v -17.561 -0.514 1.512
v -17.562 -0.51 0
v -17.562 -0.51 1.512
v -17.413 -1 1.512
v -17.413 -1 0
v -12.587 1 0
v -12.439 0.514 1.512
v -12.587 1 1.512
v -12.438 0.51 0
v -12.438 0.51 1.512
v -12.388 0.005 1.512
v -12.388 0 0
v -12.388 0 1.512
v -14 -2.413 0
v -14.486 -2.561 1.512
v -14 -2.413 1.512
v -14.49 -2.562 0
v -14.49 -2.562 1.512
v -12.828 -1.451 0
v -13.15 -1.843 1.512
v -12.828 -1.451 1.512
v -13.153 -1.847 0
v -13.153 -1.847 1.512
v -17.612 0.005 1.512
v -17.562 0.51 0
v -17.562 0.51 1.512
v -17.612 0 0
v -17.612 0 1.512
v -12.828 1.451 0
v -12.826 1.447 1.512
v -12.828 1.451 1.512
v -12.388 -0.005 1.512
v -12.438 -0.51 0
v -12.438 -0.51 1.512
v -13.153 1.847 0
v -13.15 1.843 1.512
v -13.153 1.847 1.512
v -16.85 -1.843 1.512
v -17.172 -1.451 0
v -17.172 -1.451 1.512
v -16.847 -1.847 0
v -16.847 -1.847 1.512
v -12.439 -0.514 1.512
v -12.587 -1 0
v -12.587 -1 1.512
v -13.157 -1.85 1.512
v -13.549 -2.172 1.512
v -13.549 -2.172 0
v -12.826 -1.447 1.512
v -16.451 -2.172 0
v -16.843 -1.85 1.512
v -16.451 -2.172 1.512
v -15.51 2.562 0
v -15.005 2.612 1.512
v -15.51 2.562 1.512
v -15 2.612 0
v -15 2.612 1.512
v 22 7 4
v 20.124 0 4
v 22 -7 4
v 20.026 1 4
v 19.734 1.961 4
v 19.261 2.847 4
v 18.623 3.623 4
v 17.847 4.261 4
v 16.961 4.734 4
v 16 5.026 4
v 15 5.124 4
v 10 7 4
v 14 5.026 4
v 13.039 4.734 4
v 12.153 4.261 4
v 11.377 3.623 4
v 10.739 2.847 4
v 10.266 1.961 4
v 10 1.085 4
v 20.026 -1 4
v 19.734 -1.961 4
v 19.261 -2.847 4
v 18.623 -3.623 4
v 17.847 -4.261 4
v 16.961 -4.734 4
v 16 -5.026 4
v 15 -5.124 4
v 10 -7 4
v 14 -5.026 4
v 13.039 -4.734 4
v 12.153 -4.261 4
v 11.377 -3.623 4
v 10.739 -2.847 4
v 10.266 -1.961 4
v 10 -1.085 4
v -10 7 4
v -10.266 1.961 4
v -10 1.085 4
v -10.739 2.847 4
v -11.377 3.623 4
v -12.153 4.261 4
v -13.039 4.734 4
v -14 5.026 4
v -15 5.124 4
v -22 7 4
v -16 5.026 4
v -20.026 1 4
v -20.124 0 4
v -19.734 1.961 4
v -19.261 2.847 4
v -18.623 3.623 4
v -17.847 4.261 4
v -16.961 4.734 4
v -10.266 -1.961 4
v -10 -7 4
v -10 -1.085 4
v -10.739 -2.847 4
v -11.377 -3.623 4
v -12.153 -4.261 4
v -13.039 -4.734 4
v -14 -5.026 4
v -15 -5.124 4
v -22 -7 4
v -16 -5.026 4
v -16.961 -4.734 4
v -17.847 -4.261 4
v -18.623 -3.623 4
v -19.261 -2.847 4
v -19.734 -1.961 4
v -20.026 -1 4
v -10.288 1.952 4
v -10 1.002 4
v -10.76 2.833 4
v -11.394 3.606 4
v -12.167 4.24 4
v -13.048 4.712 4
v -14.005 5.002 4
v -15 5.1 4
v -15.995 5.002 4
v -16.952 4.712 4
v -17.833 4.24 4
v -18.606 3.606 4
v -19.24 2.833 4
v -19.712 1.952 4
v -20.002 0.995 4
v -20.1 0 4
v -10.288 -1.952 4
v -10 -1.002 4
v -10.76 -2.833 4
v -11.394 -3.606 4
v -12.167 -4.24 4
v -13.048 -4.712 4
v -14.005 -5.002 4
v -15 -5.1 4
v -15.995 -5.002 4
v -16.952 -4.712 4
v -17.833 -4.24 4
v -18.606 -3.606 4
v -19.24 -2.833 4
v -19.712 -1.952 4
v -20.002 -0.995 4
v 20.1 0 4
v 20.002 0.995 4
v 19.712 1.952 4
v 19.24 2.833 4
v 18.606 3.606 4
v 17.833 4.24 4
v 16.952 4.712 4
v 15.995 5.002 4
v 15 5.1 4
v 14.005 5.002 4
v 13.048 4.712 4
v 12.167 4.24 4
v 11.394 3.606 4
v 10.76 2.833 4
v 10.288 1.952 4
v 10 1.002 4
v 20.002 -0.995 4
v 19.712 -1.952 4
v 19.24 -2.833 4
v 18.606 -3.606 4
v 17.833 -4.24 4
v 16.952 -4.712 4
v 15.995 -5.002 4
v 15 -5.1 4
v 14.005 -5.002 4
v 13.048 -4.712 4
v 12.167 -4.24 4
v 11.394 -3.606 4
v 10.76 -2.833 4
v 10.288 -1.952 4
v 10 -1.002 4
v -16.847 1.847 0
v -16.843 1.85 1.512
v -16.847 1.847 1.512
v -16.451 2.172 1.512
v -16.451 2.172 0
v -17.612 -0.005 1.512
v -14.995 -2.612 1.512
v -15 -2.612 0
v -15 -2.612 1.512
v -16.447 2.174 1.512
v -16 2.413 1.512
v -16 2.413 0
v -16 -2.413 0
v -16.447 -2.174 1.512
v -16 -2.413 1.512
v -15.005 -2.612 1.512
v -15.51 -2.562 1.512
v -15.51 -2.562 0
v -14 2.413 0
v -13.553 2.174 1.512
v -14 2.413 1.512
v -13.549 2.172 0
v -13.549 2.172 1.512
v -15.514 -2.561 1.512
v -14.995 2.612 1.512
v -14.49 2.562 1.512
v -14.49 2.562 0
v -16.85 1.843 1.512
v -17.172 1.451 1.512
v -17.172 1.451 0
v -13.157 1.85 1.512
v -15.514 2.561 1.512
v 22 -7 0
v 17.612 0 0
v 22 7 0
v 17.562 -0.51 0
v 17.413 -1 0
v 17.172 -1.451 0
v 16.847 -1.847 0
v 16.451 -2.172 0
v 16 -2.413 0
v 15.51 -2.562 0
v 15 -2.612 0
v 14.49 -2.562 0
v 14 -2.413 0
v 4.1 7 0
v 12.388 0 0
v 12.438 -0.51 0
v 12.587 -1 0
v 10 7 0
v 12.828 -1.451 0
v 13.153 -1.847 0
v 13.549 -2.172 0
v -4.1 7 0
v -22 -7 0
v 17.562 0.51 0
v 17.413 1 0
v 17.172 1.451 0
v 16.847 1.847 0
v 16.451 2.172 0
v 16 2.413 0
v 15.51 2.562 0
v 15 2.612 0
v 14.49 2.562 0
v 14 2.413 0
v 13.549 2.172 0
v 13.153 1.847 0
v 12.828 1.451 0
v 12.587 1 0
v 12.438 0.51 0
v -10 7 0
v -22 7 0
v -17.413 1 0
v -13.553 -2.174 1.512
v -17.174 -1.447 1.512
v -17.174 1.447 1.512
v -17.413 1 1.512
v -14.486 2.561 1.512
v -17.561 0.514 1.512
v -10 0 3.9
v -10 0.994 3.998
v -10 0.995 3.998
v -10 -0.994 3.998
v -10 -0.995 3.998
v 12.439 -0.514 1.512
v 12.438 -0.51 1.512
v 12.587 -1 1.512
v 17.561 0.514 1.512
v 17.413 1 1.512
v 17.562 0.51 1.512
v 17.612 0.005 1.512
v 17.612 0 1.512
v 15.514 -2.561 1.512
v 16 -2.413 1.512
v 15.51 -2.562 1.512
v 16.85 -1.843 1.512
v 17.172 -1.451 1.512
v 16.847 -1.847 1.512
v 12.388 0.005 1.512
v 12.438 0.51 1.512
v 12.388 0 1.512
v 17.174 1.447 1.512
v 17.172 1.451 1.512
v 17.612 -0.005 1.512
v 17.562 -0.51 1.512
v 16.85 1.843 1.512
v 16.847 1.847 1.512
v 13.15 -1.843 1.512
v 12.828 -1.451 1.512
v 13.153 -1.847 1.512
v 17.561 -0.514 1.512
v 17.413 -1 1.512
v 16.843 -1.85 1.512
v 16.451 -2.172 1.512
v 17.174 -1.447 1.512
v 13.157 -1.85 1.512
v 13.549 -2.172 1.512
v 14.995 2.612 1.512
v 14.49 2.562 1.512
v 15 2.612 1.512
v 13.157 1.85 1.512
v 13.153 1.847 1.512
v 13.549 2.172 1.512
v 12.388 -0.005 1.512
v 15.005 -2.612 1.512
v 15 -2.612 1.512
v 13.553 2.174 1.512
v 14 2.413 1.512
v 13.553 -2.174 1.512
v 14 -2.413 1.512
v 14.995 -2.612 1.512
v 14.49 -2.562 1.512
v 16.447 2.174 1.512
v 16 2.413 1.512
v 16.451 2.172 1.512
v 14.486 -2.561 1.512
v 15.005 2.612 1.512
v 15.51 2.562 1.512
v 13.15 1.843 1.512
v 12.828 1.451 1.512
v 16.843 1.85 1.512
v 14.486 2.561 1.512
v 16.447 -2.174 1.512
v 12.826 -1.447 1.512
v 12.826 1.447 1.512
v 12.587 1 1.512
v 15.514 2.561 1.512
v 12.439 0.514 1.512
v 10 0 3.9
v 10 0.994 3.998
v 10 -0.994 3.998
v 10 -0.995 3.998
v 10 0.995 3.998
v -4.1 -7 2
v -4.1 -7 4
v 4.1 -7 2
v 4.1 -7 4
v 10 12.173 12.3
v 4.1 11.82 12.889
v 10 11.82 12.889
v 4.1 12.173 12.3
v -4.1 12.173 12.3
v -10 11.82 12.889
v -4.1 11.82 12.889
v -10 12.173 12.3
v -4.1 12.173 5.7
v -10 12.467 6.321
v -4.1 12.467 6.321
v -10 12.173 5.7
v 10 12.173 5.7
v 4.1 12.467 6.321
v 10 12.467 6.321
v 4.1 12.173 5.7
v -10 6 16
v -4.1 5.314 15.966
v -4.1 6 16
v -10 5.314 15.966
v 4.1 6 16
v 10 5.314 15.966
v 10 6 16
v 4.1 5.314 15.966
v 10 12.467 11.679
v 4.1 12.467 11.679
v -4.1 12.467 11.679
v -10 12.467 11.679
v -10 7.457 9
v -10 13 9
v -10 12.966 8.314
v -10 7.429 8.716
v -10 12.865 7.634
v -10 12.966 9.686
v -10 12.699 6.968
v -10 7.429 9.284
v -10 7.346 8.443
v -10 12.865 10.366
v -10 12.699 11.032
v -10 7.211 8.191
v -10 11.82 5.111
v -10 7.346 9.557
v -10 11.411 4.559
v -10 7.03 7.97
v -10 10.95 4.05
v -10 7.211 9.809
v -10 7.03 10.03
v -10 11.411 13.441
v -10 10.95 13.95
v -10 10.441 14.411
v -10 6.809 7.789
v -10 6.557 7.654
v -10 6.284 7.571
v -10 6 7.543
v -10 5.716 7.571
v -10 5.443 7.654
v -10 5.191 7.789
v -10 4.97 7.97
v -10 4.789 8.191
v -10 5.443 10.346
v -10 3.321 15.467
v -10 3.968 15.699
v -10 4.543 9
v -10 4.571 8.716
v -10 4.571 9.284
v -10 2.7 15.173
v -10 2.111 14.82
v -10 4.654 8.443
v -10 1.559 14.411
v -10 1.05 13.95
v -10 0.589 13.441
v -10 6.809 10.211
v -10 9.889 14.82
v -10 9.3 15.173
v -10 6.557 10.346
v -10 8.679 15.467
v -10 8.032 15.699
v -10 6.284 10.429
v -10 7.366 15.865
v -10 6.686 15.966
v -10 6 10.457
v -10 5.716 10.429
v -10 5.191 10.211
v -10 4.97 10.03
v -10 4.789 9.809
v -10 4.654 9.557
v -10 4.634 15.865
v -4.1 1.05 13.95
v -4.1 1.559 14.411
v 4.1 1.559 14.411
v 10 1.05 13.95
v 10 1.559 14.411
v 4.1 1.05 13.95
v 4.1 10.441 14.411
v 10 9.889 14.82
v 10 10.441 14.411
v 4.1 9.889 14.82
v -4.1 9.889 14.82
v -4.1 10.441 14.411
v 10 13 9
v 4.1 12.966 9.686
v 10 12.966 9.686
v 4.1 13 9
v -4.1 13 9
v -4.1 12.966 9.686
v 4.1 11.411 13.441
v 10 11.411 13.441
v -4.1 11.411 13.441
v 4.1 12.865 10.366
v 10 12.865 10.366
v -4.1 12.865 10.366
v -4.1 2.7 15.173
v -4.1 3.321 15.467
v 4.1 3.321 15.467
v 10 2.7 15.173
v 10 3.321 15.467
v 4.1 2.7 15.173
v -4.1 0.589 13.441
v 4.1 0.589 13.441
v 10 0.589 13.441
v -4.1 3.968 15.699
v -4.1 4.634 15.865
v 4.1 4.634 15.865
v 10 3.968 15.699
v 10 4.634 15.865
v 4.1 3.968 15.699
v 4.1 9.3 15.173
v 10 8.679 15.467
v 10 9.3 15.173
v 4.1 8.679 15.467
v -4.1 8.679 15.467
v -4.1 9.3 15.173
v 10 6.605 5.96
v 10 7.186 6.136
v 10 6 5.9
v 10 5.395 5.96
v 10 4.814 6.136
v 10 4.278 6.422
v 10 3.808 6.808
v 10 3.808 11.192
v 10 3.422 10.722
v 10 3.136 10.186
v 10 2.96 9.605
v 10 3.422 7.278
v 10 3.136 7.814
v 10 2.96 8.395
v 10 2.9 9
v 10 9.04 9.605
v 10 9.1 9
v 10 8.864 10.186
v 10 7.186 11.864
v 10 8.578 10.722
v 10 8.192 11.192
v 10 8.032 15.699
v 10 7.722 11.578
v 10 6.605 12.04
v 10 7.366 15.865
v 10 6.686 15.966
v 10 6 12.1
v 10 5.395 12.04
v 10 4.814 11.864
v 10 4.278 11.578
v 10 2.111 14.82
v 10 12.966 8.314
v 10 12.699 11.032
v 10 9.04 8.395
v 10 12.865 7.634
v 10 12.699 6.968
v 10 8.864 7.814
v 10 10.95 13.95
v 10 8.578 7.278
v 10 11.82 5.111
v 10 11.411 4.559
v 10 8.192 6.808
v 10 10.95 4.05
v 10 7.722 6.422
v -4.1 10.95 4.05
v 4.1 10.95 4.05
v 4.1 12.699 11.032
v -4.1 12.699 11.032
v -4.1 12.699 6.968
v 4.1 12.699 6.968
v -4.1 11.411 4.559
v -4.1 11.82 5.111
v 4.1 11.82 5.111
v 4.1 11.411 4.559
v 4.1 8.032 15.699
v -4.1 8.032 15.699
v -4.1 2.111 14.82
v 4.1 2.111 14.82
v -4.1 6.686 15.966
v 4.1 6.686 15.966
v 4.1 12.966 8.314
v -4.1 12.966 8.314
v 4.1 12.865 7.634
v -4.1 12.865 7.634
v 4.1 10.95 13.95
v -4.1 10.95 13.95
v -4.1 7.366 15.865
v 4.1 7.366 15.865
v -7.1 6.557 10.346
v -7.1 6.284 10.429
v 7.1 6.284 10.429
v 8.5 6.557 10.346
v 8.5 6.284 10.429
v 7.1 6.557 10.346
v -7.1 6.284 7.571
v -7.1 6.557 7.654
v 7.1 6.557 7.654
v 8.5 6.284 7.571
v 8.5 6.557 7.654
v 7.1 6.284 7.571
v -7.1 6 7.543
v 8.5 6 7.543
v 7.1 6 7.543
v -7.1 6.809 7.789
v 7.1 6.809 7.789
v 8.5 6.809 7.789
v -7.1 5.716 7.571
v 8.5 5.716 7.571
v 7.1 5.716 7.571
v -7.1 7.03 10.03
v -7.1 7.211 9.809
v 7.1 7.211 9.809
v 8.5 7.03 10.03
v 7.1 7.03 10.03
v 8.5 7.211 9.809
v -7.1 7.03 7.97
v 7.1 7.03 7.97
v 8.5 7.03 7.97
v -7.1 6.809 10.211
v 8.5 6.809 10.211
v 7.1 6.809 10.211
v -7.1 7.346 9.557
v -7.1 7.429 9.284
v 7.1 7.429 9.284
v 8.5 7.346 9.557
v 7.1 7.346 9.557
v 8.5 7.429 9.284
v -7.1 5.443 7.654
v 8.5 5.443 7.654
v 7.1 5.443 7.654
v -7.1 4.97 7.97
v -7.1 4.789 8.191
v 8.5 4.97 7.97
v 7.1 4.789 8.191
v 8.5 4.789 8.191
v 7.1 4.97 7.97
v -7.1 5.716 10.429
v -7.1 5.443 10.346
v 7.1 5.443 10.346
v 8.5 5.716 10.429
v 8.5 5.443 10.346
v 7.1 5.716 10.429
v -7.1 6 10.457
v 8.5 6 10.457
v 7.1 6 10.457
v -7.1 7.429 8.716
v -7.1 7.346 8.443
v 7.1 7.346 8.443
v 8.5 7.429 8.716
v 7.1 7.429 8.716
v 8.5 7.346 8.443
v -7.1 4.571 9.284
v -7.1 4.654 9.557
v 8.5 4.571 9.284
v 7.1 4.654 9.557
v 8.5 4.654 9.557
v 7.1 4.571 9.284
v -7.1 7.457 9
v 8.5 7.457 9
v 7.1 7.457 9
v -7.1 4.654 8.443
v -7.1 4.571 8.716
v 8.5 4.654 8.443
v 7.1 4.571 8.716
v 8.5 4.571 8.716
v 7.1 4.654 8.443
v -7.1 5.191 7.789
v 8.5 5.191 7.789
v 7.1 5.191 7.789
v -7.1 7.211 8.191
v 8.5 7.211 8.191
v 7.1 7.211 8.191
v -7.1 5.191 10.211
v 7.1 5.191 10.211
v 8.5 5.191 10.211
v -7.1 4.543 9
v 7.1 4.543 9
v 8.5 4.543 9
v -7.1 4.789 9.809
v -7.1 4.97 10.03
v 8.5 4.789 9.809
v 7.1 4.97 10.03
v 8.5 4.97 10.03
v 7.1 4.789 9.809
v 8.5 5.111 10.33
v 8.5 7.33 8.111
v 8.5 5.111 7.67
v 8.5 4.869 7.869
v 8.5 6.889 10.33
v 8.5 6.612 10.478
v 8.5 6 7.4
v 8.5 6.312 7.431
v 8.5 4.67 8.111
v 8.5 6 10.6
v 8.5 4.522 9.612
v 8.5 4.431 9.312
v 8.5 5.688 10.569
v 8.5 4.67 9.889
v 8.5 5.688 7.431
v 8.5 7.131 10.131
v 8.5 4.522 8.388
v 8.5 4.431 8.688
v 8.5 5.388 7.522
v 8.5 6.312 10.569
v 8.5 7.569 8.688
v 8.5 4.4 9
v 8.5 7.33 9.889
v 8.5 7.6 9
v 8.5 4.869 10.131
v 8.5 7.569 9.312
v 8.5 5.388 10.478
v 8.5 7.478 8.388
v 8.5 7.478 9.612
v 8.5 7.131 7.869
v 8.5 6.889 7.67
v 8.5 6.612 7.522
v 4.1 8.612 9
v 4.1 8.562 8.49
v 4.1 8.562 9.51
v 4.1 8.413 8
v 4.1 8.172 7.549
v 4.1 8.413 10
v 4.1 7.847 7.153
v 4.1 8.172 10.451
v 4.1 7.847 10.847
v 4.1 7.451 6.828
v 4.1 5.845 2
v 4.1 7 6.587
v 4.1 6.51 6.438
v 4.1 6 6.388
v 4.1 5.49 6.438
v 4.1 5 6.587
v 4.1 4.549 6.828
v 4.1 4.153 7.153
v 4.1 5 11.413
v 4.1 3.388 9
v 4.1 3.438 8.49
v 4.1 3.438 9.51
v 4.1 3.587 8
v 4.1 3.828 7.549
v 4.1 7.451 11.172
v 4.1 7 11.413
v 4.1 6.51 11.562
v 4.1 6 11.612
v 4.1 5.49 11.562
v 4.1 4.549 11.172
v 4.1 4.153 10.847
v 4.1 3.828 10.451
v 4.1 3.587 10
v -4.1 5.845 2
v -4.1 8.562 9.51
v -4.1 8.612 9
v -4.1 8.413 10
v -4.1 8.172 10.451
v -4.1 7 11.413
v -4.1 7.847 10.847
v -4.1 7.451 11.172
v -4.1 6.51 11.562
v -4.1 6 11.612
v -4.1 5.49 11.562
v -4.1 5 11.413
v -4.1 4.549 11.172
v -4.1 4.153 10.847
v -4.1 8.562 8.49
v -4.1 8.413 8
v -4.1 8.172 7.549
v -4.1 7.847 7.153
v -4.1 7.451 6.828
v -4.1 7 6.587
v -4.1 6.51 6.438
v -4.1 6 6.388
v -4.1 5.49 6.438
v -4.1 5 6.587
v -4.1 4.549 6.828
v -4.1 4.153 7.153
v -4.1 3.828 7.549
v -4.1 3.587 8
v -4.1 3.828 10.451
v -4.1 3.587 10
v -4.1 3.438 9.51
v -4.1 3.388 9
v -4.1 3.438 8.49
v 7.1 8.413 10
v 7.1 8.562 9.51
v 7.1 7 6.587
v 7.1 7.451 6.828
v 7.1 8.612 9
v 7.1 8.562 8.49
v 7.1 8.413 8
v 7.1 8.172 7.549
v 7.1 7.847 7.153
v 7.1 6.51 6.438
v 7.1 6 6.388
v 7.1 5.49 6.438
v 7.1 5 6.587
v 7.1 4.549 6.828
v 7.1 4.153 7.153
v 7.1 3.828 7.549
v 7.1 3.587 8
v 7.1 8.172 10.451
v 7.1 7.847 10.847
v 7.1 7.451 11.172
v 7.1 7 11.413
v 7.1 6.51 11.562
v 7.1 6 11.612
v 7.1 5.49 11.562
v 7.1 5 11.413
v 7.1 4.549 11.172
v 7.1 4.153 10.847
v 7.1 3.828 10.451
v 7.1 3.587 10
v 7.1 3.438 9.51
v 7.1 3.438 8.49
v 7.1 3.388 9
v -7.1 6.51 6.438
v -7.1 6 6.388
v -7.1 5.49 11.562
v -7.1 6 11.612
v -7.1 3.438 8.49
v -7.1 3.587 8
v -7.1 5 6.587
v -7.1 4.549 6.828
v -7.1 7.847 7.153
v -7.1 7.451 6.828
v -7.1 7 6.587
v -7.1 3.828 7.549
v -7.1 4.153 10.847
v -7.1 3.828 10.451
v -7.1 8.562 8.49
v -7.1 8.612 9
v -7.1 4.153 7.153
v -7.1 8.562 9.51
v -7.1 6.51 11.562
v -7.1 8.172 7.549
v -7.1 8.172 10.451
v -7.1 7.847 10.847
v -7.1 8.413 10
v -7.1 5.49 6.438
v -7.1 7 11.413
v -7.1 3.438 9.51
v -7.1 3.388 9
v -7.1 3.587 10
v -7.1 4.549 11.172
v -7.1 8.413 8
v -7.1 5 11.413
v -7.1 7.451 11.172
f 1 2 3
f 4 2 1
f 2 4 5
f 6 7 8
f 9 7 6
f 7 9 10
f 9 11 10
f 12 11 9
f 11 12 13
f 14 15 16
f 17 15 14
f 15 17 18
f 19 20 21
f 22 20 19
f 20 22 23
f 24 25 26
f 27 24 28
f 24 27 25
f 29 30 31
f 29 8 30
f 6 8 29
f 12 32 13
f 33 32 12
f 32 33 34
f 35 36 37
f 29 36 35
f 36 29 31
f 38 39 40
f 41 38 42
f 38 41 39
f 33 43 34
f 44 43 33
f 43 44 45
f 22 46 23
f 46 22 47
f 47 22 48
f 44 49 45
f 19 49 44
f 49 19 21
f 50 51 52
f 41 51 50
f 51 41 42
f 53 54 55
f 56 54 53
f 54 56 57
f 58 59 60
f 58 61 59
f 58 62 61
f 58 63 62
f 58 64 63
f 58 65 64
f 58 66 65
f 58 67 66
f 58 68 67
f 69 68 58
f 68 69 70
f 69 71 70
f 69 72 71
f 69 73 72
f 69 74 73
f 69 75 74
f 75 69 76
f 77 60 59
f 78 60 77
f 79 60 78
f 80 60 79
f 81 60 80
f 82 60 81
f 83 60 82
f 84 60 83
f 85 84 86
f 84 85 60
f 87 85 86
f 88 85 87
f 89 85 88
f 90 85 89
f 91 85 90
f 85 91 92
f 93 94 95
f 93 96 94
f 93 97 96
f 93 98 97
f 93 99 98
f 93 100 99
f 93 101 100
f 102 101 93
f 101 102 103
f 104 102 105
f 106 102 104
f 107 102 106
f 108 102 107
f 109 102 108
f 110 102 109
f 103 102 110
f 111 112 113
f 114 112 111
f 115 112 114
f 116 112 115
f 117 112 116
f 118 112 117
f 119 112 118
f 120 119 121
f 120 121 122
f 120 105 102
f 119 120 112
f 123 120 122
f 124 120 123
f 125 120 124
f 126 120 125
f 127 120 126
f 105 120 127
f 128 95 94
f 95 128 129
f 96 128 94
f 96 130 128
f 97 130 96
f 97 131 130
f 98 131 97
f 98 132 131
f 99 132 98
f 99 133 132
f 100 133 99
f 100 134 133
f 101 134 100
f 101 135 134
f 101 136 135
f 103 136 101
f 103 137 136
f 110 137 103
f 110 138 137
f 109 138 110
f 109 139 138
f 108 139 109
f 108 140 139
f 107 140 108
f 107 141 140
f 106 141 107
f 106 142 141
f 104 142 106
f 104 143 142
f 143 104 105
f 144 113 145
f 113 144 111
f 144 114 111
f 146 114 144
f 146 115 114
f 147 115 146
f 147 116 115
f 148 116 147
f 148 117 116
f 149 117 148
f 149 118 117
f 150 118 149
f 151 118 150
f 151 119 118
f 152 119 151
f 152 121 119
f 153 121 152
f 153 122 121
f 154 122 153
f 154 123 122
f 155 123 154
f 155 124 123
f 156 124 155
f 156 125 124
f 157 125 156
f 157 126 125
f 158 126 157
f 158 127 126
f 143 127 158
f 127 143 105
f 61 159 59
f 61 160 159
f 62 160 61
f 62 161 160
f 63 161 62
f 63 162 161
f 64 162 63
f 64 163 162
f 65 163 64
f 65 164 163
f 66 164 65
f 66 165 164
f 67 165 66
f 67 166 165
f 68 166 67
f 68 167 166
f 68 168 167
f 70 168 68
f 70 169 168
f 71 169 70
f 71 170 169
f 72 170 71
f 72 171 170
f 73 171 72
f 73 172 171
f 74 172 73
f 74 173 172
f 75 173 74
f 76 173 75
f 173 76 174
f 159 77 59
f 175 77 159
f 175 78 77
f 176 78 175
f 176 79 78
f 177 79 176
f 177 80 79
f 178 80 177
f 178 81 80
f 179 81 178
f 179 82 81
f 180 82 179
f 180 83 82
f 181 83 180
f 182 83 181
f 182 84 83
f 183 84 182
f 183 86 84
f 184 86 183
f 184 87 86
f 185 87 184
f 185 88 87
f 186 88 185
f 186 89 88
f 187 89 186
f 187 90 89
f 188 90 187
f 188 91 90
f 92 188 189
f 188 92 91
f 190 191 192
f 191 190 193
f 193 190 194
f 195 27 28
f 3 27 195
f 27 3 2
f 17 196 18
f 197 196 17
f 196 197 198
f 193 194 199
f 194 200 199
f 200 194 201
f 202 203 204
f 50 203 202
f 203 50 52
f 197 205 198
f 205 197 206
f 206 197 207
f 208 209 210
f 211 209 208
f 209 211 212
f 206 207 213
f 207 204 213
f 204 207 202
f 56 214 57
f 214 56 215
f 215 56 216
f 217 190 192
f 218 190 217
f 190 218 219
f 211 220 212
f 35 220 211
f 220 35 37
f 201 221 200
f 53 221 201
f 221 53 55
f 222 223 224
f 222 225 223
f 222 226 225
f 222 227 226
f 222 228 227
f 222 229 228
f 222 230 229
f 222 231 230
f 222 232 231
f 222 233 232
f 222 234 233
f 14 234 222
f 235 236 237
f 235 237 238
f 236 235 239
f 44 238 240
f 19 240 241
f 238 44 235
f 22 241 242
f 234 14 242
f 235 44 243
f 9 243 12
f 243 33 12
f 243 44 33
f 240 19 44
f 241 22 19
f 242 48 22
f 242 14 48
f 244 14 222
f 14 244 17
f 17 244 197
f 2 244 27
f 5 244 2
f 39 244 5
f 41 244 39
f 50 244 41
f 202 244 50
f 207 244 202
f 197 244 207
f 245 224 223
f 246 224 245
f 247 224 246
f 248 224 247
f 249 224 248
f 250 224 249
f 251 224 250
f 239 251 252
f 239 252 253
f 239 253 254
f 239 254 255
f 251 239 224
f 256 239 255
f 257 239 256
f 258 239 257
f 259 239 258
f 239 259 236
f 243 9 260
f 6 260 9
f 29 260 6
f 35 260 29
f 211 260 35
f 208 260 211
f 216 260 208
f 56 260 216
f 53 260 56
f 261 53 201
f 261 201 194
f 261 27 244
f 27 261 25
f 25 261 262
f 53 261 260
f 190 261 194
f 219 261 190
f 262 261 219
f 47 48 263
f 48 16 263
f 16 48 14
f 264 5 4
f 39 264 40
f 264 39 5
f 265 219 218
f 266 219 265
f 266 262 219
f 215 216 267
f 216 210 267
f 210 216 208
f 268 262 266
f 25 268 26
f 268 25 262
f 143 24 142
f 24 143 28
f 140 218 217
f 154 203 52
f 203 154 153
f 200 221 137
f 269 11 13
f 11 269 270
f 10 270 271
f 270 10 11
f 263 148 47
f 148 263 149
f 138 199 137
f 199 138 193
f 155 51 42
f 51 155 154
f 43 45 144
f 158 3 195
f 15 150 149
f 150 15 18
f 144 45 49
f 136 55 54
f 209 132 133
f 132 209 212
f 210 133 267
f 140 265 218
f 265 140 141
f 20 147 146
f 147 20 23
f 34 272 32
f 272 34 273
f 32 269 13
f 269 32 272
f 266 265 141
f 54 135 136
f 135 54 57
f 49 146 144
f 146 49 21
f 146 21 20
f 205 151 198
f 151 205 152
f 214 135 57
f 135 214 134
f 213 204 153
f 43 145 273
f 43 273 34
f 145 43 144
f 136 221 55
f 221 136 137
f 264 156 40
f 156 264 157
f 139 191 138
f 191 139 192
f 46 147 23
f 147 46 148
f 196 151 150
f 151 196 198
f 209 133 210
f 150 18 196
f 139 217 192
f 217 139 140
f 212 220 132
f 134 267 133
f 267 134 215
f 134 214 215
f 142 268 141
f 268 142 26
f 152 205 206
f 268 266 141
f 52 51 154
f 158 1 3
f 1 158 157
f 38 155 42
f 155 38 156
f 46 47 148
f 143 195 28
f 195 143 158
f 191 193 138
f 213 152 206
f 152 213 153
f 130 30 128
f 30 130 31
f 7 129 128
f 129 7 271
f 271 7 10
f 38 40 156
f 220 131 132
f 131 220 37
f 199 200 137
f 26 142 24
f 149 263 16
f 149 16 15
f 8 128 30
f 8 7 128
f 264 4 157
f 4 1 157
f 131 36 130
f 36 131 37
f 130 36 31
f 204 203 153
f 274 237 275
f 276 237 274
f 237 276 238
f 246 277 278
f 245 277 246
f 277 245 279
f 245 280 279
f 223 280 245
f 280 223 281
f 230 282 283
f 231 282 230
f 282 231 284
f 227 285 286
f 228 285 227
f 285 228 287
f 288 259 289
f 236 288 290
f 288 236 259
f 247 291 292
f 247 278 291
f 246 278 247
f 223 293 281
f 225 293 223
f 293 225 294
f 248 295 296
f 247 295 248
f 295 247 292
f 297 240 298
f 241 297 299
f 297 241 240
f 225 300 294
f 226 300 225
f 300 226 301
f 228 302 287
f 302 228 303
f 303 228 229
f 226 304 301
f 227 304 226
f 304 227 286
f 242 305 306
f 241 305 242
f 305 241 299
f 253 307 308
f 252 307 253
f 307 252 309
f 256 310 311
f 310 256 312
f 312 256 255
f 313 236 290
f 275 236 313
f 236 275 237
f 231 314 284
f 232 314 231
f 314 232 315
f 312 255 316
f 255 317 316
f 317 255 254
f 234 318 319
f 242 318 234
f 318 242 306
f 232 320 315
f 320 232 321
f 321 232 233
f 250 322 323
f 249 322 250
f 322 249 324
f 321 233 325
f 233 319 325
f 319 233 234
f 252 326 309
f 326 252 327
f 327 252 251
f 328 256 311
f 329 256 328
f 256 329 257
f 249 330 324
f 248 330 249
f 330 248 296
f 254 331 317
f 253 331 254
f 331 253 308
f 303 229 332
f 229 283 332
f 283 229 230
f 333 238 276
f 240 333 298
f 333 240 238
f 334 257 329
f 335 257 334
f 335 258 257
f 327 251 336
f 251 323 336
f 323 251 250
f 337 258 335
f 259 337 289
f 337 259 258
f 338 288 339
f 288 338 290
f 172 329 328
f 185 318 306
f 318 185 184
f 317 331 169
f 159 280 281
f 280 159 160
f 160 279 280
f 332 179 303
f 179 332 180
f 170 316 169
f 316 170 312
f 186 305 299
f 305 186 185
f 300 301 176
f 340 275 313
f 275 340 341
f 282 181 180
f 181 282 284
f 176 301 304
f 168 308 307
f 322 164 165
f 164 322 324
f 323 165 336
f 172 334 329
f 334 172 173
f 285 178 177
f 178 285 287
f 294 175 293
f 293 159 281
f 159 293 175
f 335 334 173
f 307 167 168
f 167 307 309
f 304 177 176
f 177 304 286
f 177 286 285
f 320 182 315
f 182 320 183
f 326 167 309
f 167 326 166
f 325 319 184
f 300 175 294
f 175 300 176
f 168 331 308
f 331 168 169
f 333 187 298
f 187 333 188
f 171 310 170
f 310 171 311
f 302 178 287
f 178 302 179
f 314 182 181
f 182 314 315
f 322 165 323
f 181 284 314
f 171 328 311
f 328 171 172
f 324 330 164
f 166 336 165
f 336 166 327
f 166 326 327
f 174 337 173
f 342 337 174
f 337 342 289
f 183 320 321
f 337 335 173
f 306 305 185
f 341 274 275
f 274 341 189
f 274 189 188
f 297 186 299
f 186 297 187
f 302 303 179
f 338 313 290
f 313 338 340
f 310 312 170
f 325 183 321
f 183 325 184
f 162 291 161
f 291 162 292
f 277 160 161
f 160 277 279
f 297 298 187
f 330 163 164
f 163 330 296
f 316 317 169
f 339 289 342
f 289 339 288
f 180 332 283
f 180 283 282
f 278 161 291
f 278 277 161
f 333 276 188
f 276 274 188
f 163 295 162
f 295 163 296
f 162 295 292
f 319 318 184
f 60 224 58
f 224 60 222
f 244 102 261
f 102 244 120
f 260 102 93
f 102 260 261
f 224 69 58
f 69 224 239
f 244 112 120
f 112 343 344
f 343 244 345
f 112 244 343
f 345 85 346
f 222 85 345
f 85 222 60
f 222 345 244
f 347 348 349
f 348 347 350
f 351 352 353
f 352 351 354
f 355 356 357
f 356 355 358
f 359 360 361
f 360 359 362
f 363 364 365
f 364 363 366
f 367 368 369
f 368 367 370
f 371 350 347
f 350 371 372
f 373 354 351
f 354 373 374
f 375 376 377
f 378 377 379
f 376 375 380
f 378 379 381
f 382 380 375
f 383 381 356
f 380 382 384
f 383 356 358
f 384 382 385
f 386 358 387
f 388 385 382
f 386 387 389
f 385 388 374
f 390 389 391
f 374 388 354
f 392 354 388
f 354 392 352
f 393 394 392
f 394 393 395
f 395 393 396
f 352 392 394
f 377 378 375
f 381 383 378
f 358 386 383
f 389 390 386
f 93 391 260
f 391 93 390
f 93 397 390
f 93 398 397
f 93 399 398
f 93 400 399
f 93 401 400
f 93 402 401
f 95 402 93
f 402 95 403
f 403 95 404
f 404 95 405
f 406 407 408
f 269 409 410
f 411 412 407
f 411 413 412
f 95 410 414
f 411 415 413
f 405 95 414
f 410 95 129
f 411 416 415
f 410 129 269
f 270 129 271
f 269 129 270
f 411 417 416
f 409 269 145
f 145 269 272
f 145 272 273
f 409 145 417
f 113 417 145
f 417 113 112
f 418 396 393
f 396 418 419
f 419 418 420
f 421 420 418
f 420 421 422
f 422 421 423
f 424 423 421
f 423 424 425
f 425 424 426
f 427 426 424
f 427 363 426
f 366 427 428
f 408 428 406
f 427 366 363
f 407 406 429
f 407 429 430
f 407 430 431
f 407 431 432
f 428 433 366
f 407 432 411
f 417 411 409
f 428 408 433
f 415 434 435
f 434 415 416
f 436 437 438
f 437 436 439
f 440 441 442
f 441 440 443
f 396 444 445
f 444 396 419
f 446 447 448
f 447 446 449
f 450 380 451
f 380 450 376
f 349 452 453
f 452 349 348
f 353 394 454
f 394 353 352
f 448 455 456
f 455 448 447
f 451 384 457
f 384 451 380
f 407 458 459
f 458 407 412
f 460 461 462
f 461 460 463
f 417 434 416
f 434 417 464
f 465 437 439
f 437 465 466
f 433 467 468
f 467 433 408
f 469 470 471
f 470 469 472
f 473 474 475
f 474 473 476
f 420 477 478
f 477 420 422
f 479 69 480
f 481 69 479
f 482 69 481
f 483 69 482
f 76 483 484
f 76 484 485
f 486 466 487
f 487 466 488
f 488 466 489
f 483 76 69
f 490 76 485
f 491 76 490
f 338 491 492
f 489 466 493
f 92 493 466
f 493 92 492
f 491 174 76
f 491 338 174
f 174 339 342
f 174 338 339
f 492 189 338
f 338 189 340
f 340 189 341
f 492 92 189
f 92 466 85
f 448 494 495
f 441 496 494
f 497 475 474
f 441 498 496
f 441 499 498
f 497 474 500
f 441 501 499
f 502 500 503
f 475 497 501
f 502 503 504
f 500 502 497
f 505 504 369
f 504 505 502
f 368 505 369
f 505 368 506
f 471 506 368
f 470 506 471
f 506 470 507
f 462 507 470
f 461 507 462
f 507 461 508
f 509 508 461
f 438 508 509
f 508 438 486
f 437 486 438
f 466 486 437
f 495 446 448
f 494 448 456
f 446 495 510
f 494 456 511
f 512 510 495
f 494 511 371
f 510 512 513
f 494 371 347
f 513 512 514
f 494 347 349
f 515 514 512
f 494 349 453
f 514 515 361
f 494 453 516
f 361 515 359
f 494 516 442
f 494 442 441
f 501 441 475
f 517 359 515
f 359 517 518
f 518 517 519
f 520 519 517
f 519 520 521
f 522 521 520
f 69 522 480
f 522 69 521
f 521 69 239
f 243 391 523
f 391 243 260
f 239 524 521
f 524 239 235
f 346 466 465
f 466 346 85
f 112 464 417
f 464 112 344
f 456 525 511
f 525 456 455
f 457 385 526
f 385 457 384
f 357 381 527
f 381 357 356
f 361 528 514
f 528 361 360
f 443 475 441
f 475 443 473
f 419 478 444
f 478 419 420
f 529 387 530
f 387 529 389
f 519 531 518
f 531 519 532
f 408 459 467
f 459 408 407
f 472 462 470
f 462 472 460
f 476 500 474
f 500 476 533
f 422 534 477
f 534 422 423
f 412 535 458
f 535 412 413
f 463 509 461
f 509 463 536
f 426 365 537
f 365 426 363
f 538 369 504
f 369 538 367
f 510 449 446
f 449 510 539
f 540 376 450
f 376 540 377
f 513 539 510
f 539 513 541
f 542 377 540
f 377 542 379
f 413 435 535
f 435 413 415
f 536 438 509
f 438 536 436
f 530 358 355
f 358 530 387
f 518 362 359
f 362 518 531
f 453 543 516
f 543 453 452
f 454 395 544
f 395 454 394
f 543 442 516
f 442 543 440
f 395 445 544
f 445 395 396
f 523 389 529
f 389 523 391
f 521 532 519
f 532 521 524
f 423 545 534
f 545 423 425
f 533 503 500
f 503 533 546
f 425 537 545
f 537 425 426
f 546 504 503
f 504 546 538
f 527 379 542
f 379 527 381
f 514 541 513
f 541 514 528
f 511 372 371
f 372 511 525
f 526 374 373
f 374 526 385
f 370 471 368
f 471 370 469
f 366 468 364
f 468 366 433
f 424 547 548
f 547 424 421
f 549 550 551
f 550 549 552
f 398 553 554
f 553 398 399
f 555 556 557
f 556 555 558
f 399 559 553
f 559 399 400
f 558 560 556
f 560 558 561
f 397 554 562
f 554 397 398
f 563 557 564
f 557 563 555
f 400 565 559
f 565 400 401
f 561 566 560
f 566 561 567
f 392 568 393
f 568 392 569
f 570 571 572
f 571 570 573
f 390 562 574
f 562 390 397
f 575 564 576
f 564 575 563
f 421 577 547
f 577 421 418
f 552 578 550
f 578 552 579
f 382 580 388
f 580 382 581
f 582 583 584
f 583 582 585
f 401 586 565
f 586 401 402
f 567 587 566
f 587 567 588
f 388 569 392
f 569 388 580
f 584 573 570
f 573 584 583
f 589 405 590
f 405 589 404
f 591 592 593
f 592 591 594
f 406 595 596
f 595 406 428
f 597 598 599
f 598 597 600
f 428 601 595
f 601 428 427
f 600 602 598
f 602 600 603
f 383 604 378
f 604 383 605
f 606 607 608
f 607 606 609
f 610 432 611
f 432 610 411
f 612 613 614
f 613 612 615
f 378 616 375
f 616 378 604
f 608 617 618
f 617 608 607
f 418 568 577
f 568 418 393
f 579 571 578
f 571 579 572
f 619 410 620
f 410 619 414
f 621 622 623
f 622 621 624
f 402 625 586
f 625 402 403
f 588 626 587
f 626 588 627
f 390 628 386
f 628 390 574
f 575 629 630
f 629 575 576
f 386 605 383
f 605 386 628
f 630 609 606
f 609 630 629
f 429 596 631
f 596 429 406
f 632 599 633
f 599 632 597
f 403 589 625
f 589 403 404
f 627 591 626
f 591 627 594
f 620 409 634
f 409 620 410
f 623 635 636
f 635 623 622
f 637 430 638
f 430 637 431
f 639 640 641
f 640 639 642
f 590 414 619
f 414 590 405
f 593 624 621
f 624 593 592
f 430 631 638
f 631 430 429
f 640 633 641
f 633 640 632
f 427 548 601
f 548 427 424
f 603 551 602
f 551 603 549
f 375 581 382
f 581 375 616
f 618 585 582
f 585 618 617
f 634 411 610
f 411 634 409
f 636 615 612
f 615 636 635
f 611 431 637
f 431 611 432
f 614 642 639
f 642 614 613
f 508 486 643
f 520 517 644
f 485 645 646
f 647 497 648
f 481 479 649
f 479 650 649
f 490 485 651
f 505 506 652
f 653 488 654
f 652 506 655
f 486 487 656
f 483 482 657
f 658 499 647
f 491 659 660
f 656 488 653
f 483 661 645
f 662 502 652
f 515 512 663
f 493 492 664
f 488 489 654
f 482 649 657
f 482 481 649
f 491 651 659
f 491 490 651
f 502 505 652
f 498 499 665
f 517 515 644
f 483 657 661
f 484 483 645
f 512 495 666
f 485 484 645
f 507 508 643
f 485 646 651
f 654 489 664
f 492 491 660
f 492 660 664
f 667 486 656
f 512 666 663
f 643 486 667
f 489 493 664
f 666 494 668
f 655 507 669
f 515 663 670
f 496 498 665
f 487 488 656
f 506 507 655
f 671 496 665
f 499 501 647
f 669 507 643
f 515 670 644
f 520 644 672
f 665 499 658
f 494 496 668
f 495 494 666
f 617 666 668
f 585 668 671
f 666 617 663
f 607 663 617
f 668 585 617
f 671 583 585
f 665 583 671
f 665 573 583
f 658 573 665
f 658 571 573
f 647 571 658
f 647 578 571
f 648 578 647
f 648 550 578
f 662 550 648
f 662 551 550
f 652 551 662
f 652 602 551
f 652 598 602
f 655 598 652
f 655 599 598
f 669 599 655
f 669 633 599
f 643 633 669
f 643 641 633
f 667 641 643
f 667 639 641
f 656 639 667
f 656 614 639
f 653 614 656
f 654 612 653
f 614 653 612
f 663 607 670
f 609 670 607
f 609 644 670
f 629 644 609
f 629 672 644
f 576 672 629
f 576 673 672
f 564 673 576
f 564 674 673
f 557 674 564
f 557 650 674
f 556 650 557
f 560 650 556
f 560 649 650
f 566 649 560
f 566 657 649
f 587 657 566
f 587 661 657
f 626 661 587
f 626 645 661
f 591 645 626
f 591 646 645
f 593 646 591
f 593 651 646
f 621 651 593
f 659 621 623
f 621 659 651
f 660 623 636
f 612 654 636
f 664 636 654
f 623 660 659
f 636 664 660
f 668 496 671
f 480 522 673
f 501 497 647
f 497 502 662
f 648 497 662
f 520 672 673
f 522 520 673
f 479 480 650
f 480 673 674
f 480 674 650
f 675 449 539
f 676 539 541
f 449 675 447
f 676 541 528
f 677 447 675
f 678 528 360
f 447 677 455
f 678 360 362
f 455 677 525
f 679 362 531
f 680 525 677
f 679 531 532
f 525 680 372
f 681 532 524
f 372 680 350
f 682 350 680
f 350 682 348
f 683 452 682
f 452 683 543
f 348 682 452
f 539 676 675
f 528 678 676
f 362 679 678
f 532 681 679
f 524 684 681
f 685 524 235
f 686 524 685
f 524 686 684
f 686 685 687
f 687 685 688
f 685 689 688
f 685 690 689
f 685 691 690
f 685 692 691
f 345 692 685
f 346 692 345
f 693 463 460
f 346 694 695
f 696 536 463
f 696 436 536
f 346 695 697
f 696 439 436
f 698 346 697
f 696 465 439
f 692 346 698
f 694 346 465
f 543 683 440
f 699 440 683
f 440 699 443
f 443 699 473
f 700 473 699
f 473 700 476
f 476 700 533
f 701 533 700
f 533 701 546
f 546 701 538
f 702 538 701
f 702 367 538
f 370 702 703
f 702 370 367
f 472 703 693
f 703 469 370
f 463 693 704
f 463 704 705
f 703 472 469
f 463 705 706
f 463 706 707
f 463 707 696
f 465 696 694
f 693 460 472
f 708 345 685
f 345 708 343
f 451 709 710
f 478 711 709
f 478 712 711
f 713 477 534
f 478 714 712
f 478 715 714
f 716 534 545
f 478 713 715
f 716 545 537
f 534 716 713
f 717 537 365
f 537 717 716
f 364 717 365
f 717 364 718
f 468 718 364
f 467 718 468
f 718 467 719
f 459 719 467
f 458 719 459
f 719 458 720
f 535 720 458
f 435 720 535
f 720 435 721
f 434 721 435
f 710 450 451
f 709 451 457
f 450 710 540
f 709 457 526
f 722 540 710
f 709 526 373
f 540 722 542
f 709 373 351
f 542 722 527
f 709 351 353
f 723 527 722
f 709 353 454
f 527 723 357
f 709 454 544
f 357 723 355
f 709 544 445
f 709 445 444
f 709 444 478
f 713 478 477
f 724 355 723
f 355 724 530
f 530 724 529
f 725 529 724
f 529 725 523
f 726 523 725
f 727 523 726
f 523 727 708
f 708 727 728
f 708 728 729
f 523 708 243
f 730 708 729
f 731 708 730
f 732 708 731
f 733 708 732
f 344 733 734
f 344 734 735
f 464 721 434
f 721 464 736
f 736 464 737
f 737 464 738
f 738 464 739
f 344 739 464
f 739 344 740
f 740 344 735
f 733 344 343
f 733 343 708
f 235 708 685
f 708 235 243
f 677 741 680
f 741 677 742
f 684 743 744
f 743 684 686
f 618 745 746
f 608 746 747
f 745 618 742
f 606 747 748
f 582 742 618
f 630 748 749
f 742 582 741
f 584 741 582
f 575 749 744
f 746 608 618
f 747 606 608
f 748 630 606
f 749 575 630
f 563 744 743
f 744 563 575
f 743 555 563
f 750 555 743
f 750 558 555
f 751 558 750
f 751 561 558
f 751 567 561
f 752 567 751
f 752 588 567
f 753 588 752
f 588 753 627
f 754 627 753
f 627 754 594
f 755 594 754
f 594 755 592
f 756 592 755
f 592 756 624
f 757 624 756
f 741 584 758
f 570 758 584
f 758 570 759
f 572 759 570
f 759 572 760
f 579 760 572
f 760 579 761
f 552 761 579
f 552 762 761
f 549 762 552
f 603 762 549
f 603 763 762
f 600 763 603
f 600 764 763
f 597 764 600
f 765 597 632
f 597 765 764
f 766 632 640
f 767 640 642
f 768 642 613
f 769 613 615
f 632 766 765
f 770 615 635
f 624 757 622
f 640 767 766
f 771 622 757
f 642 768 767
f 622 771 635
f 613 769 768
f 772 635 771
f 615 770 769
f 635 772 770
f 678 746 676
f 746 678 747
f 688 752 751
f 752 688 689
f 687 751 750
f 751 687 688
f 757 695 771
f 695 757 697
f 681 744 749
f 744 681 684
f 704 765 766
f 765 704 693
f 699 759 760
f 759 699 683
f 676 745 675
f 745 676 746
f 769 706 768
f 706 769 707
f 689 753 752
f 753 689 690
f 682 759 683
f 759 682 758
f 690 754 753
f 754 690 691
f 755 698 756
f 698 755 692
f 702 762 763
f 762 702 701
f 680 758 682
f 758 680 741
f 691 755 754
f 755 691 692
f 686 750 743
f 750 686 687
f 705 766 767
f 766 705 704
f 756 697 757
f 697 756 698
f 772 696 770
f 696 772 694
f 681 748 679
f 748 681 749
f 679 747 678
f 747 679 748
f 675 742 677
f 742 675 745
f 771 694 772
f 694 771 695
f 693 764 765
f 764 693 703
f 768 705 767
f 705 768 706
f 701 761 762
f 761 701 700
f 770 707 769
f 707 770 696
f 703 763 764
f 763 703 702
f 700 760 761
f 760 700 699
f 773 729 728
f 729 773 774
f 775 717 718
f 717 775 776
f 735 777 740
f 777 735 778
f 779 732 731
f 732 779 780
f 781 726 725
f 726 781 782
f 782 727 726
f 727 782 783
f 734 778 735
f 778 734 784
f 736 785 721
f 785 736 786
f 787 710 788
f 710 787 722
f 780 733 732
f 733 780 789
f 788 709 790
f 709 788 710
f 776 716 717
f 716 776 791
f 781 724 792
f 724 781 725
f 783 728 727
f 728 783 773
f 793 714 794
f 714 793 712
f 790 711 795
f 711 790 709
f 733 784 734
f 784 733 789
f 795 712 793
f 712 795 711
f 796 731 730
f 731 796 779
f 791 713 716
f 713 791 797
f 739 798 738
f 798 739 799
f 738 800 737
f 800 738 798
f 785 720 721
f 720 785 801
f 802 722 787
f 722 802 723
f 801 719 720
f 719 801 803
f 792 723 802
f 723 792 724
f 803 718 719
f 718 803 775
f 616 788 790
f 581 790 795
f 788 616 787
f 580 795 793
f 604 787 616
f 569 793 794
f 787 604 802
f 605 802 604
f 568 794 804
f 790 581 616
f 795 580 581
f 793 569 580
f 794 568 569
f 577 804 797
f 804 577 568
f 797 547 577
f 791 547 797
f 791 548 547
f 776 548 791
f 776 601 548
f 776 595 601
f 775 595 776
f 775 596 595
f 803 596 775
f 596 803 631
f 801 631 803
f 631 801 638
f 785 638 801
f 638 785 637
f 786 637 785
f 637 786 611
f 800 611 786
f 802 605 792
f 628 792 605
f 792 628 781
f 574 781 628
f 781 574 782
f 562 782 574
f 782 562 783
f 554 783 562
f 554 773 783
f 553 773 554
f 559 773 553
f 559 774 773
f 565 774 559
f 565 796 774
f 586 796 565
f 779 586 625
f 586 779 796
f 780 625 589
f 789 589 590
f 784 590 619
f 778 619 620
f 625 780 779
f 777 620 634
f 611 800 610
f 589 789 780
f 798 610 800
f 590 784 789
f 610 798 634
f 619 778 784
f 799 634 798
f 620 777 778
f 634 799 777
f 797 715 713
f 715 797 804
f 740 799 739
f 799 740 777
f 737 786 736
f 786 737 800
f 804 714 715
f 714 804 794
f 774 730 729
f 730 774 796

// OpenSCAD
// file: bolts.scad
$radial_error = 0.1;
$fn = 32;

module cylinder_outer(height, radius, fn=$fn) {
	fudge = 1/cos(180/fn);
	cylinder(h=height,r=radius*fudge+$radial_error, $fn=fn);
}

module cylinder_inner(height, radius, fn=$fn) {
	cylinder(h=height,r=radius-$radial_error,$fn=fn);
}

// Make a hole for a bolt/screw combination.
module bolt(diameter=3, depth=8, nut_offset=2, shaft_length=10, inset=10) {
	hole(diameter, depth, inset);
	hull() {
		shaft_width = diameter;
		translate([0, 0, nut_offset]) rotate(360/12, [0, 0, 1]) cylinder_outer(diameter, shaft_width, 6);
		translate([0, shaft_length, nut_offset]) rotate(360/12, [0, 0, 1]) cylinder_outer(diameter, shaft_width, 6);
	}
}

// Make a hole. The diameter is the size of the screw (e.g. 3 for M3). Depth is how far the hole should go for the thread, and inset is how far out there should be a hole for the head to go.
module hole(diameter=3, depth=6, inset=10) {
	cylinder_outer(depth, diameter/2);
	translate([0, 0, depth]) cylinder_outer(inset, diameter, 32);
}

module countersunk_hole(diameter=3, depth=6, inset=10) {
	hole(diameter, depth, inset);
	translate([0, 0, depth-diameter/2]) cylinder(r1=diameter/2+$radial_error, r2=diameter+$radial_error, h=diameter/2);
}

module threaded_countersunk_hole(diameter=3, depth=6, inset=10) {
	hole(diameter*0.9, depth, inset);
	translate([0, 0, depth-diameter/2]) cylinder(r1=diameter/2+$radial_error, r2=diameter+$radial_error, h=diameter/2);
}

module countersunk_bolt(diameter=3, depth=8, nut_offset=2, shaft_length=10, inset=10) {
	countersunk_hole(diameter, depth, inset);
	hull() {
		shaft_width = diameter;
		translate([0, 0, nut_offset]) rotate(360/12, [0, 0, 1]) cylinder_outer(diameter, shaft_width, 6);
		translate([0, shaft_length, nut_offset]) rotate(360/12, [0, 0, 1]) cylinder_outer(diameter, shaft_width, 6);
	}
}

module mounting_hole(diameter=3, depth=6, inset=10, outset=3) {
	difference() {
		cylinder_outer(depth, diameter/2+outset);
		hole(diameter=diameter, depth=depth, inset=inset);
	}
}

rotate(90, [1, 0, 0]) difference() {
	cube([30, 10, 10]);
	translate([5, 5, 0]) bolt(diameter=3, depth=8);
	translate([15, 5, 0]) bolt(diameter=4, depth=8);
	translate([25, 5, 0]) countersunk_hole(diameter=4, depth=8);
}
// file: zcube.scad
// This function creates a cube with a given x/y either above (f=1) or below (f=-1) the z axis.
module zcube(dimensions, z=0, f=1) {
	translate([0, 0, dimensions[2]/2 * f + z]) cube(dimensions, true);
}
// main file
use <zcube.scad>;
use <bolts.scad>;

$fn = 64;

width = 44;
height = 14;
thickness = 4;
diameter = 4;

module magnet(h=3,d=5) {
	cylinder_outer(h, d/2, 32);
}

module bracket(spacing=30) {
	difference() {
		zcube([width, height, thickness]);
		translate([0, 0, 2]) zcube([16, height, 2]);
		translate([-spacing/2, 0, 0]) countersunk_hole(5, depth=thickness);
		translate([ spacing/2, 0, 0]) countersunk_hole(5, depth=thickness);
	}
}

module side(height=height, thickness=thickness, diameter=8) {
	translate([thickness/2, 0, 0]) hull() {
		zcube([thickness, height, thickness]);
		translate([diameter/2+thickness/2, 6, 0]) cylinder_inner(thickness, diameter);
	}
}

module bottom(latch_width=20, gap=8.2, outset=10, offset=6, inset=2) {
	difference() {
		union() {
			bracket();
			
			hull() {
				zcube([latch_width, height, thickness]);
				translate([-latch_width/2, offset, outset/2+thickness]) rotate(90, [0, 1, 0]) cylinder(d=height, h=latch_width);
			}
		}
		
		translate([0, 0, thickness-inset]) zcube([gap, height+offset*2, latch_width]);
		
		translate([0, height/2, 0]) rotate(-60, [1, 0, 0]) translate([0, -height/2, 0]) zcube([gap, height*2, latch_width]);
		
		translate([-latch_width/2, offset, outset/2+thickness]) rotate(90, [0, 1, 0]) threaded_countersunk_hole(3, depth=latch_width, nut_offset=0, shaft_length=0);
		
		translate([gap/2, offset, outset/2+thickness]) rotate(90, [0, 1, 0]) {
			magnet();
		}
		
		translate([-gap/2, offset, outset/2+thickness]) rotate(90, [0, 1, 0]) {
			mirror([0, 0, 1]) magnet();
		}
	}
}

bottom();
